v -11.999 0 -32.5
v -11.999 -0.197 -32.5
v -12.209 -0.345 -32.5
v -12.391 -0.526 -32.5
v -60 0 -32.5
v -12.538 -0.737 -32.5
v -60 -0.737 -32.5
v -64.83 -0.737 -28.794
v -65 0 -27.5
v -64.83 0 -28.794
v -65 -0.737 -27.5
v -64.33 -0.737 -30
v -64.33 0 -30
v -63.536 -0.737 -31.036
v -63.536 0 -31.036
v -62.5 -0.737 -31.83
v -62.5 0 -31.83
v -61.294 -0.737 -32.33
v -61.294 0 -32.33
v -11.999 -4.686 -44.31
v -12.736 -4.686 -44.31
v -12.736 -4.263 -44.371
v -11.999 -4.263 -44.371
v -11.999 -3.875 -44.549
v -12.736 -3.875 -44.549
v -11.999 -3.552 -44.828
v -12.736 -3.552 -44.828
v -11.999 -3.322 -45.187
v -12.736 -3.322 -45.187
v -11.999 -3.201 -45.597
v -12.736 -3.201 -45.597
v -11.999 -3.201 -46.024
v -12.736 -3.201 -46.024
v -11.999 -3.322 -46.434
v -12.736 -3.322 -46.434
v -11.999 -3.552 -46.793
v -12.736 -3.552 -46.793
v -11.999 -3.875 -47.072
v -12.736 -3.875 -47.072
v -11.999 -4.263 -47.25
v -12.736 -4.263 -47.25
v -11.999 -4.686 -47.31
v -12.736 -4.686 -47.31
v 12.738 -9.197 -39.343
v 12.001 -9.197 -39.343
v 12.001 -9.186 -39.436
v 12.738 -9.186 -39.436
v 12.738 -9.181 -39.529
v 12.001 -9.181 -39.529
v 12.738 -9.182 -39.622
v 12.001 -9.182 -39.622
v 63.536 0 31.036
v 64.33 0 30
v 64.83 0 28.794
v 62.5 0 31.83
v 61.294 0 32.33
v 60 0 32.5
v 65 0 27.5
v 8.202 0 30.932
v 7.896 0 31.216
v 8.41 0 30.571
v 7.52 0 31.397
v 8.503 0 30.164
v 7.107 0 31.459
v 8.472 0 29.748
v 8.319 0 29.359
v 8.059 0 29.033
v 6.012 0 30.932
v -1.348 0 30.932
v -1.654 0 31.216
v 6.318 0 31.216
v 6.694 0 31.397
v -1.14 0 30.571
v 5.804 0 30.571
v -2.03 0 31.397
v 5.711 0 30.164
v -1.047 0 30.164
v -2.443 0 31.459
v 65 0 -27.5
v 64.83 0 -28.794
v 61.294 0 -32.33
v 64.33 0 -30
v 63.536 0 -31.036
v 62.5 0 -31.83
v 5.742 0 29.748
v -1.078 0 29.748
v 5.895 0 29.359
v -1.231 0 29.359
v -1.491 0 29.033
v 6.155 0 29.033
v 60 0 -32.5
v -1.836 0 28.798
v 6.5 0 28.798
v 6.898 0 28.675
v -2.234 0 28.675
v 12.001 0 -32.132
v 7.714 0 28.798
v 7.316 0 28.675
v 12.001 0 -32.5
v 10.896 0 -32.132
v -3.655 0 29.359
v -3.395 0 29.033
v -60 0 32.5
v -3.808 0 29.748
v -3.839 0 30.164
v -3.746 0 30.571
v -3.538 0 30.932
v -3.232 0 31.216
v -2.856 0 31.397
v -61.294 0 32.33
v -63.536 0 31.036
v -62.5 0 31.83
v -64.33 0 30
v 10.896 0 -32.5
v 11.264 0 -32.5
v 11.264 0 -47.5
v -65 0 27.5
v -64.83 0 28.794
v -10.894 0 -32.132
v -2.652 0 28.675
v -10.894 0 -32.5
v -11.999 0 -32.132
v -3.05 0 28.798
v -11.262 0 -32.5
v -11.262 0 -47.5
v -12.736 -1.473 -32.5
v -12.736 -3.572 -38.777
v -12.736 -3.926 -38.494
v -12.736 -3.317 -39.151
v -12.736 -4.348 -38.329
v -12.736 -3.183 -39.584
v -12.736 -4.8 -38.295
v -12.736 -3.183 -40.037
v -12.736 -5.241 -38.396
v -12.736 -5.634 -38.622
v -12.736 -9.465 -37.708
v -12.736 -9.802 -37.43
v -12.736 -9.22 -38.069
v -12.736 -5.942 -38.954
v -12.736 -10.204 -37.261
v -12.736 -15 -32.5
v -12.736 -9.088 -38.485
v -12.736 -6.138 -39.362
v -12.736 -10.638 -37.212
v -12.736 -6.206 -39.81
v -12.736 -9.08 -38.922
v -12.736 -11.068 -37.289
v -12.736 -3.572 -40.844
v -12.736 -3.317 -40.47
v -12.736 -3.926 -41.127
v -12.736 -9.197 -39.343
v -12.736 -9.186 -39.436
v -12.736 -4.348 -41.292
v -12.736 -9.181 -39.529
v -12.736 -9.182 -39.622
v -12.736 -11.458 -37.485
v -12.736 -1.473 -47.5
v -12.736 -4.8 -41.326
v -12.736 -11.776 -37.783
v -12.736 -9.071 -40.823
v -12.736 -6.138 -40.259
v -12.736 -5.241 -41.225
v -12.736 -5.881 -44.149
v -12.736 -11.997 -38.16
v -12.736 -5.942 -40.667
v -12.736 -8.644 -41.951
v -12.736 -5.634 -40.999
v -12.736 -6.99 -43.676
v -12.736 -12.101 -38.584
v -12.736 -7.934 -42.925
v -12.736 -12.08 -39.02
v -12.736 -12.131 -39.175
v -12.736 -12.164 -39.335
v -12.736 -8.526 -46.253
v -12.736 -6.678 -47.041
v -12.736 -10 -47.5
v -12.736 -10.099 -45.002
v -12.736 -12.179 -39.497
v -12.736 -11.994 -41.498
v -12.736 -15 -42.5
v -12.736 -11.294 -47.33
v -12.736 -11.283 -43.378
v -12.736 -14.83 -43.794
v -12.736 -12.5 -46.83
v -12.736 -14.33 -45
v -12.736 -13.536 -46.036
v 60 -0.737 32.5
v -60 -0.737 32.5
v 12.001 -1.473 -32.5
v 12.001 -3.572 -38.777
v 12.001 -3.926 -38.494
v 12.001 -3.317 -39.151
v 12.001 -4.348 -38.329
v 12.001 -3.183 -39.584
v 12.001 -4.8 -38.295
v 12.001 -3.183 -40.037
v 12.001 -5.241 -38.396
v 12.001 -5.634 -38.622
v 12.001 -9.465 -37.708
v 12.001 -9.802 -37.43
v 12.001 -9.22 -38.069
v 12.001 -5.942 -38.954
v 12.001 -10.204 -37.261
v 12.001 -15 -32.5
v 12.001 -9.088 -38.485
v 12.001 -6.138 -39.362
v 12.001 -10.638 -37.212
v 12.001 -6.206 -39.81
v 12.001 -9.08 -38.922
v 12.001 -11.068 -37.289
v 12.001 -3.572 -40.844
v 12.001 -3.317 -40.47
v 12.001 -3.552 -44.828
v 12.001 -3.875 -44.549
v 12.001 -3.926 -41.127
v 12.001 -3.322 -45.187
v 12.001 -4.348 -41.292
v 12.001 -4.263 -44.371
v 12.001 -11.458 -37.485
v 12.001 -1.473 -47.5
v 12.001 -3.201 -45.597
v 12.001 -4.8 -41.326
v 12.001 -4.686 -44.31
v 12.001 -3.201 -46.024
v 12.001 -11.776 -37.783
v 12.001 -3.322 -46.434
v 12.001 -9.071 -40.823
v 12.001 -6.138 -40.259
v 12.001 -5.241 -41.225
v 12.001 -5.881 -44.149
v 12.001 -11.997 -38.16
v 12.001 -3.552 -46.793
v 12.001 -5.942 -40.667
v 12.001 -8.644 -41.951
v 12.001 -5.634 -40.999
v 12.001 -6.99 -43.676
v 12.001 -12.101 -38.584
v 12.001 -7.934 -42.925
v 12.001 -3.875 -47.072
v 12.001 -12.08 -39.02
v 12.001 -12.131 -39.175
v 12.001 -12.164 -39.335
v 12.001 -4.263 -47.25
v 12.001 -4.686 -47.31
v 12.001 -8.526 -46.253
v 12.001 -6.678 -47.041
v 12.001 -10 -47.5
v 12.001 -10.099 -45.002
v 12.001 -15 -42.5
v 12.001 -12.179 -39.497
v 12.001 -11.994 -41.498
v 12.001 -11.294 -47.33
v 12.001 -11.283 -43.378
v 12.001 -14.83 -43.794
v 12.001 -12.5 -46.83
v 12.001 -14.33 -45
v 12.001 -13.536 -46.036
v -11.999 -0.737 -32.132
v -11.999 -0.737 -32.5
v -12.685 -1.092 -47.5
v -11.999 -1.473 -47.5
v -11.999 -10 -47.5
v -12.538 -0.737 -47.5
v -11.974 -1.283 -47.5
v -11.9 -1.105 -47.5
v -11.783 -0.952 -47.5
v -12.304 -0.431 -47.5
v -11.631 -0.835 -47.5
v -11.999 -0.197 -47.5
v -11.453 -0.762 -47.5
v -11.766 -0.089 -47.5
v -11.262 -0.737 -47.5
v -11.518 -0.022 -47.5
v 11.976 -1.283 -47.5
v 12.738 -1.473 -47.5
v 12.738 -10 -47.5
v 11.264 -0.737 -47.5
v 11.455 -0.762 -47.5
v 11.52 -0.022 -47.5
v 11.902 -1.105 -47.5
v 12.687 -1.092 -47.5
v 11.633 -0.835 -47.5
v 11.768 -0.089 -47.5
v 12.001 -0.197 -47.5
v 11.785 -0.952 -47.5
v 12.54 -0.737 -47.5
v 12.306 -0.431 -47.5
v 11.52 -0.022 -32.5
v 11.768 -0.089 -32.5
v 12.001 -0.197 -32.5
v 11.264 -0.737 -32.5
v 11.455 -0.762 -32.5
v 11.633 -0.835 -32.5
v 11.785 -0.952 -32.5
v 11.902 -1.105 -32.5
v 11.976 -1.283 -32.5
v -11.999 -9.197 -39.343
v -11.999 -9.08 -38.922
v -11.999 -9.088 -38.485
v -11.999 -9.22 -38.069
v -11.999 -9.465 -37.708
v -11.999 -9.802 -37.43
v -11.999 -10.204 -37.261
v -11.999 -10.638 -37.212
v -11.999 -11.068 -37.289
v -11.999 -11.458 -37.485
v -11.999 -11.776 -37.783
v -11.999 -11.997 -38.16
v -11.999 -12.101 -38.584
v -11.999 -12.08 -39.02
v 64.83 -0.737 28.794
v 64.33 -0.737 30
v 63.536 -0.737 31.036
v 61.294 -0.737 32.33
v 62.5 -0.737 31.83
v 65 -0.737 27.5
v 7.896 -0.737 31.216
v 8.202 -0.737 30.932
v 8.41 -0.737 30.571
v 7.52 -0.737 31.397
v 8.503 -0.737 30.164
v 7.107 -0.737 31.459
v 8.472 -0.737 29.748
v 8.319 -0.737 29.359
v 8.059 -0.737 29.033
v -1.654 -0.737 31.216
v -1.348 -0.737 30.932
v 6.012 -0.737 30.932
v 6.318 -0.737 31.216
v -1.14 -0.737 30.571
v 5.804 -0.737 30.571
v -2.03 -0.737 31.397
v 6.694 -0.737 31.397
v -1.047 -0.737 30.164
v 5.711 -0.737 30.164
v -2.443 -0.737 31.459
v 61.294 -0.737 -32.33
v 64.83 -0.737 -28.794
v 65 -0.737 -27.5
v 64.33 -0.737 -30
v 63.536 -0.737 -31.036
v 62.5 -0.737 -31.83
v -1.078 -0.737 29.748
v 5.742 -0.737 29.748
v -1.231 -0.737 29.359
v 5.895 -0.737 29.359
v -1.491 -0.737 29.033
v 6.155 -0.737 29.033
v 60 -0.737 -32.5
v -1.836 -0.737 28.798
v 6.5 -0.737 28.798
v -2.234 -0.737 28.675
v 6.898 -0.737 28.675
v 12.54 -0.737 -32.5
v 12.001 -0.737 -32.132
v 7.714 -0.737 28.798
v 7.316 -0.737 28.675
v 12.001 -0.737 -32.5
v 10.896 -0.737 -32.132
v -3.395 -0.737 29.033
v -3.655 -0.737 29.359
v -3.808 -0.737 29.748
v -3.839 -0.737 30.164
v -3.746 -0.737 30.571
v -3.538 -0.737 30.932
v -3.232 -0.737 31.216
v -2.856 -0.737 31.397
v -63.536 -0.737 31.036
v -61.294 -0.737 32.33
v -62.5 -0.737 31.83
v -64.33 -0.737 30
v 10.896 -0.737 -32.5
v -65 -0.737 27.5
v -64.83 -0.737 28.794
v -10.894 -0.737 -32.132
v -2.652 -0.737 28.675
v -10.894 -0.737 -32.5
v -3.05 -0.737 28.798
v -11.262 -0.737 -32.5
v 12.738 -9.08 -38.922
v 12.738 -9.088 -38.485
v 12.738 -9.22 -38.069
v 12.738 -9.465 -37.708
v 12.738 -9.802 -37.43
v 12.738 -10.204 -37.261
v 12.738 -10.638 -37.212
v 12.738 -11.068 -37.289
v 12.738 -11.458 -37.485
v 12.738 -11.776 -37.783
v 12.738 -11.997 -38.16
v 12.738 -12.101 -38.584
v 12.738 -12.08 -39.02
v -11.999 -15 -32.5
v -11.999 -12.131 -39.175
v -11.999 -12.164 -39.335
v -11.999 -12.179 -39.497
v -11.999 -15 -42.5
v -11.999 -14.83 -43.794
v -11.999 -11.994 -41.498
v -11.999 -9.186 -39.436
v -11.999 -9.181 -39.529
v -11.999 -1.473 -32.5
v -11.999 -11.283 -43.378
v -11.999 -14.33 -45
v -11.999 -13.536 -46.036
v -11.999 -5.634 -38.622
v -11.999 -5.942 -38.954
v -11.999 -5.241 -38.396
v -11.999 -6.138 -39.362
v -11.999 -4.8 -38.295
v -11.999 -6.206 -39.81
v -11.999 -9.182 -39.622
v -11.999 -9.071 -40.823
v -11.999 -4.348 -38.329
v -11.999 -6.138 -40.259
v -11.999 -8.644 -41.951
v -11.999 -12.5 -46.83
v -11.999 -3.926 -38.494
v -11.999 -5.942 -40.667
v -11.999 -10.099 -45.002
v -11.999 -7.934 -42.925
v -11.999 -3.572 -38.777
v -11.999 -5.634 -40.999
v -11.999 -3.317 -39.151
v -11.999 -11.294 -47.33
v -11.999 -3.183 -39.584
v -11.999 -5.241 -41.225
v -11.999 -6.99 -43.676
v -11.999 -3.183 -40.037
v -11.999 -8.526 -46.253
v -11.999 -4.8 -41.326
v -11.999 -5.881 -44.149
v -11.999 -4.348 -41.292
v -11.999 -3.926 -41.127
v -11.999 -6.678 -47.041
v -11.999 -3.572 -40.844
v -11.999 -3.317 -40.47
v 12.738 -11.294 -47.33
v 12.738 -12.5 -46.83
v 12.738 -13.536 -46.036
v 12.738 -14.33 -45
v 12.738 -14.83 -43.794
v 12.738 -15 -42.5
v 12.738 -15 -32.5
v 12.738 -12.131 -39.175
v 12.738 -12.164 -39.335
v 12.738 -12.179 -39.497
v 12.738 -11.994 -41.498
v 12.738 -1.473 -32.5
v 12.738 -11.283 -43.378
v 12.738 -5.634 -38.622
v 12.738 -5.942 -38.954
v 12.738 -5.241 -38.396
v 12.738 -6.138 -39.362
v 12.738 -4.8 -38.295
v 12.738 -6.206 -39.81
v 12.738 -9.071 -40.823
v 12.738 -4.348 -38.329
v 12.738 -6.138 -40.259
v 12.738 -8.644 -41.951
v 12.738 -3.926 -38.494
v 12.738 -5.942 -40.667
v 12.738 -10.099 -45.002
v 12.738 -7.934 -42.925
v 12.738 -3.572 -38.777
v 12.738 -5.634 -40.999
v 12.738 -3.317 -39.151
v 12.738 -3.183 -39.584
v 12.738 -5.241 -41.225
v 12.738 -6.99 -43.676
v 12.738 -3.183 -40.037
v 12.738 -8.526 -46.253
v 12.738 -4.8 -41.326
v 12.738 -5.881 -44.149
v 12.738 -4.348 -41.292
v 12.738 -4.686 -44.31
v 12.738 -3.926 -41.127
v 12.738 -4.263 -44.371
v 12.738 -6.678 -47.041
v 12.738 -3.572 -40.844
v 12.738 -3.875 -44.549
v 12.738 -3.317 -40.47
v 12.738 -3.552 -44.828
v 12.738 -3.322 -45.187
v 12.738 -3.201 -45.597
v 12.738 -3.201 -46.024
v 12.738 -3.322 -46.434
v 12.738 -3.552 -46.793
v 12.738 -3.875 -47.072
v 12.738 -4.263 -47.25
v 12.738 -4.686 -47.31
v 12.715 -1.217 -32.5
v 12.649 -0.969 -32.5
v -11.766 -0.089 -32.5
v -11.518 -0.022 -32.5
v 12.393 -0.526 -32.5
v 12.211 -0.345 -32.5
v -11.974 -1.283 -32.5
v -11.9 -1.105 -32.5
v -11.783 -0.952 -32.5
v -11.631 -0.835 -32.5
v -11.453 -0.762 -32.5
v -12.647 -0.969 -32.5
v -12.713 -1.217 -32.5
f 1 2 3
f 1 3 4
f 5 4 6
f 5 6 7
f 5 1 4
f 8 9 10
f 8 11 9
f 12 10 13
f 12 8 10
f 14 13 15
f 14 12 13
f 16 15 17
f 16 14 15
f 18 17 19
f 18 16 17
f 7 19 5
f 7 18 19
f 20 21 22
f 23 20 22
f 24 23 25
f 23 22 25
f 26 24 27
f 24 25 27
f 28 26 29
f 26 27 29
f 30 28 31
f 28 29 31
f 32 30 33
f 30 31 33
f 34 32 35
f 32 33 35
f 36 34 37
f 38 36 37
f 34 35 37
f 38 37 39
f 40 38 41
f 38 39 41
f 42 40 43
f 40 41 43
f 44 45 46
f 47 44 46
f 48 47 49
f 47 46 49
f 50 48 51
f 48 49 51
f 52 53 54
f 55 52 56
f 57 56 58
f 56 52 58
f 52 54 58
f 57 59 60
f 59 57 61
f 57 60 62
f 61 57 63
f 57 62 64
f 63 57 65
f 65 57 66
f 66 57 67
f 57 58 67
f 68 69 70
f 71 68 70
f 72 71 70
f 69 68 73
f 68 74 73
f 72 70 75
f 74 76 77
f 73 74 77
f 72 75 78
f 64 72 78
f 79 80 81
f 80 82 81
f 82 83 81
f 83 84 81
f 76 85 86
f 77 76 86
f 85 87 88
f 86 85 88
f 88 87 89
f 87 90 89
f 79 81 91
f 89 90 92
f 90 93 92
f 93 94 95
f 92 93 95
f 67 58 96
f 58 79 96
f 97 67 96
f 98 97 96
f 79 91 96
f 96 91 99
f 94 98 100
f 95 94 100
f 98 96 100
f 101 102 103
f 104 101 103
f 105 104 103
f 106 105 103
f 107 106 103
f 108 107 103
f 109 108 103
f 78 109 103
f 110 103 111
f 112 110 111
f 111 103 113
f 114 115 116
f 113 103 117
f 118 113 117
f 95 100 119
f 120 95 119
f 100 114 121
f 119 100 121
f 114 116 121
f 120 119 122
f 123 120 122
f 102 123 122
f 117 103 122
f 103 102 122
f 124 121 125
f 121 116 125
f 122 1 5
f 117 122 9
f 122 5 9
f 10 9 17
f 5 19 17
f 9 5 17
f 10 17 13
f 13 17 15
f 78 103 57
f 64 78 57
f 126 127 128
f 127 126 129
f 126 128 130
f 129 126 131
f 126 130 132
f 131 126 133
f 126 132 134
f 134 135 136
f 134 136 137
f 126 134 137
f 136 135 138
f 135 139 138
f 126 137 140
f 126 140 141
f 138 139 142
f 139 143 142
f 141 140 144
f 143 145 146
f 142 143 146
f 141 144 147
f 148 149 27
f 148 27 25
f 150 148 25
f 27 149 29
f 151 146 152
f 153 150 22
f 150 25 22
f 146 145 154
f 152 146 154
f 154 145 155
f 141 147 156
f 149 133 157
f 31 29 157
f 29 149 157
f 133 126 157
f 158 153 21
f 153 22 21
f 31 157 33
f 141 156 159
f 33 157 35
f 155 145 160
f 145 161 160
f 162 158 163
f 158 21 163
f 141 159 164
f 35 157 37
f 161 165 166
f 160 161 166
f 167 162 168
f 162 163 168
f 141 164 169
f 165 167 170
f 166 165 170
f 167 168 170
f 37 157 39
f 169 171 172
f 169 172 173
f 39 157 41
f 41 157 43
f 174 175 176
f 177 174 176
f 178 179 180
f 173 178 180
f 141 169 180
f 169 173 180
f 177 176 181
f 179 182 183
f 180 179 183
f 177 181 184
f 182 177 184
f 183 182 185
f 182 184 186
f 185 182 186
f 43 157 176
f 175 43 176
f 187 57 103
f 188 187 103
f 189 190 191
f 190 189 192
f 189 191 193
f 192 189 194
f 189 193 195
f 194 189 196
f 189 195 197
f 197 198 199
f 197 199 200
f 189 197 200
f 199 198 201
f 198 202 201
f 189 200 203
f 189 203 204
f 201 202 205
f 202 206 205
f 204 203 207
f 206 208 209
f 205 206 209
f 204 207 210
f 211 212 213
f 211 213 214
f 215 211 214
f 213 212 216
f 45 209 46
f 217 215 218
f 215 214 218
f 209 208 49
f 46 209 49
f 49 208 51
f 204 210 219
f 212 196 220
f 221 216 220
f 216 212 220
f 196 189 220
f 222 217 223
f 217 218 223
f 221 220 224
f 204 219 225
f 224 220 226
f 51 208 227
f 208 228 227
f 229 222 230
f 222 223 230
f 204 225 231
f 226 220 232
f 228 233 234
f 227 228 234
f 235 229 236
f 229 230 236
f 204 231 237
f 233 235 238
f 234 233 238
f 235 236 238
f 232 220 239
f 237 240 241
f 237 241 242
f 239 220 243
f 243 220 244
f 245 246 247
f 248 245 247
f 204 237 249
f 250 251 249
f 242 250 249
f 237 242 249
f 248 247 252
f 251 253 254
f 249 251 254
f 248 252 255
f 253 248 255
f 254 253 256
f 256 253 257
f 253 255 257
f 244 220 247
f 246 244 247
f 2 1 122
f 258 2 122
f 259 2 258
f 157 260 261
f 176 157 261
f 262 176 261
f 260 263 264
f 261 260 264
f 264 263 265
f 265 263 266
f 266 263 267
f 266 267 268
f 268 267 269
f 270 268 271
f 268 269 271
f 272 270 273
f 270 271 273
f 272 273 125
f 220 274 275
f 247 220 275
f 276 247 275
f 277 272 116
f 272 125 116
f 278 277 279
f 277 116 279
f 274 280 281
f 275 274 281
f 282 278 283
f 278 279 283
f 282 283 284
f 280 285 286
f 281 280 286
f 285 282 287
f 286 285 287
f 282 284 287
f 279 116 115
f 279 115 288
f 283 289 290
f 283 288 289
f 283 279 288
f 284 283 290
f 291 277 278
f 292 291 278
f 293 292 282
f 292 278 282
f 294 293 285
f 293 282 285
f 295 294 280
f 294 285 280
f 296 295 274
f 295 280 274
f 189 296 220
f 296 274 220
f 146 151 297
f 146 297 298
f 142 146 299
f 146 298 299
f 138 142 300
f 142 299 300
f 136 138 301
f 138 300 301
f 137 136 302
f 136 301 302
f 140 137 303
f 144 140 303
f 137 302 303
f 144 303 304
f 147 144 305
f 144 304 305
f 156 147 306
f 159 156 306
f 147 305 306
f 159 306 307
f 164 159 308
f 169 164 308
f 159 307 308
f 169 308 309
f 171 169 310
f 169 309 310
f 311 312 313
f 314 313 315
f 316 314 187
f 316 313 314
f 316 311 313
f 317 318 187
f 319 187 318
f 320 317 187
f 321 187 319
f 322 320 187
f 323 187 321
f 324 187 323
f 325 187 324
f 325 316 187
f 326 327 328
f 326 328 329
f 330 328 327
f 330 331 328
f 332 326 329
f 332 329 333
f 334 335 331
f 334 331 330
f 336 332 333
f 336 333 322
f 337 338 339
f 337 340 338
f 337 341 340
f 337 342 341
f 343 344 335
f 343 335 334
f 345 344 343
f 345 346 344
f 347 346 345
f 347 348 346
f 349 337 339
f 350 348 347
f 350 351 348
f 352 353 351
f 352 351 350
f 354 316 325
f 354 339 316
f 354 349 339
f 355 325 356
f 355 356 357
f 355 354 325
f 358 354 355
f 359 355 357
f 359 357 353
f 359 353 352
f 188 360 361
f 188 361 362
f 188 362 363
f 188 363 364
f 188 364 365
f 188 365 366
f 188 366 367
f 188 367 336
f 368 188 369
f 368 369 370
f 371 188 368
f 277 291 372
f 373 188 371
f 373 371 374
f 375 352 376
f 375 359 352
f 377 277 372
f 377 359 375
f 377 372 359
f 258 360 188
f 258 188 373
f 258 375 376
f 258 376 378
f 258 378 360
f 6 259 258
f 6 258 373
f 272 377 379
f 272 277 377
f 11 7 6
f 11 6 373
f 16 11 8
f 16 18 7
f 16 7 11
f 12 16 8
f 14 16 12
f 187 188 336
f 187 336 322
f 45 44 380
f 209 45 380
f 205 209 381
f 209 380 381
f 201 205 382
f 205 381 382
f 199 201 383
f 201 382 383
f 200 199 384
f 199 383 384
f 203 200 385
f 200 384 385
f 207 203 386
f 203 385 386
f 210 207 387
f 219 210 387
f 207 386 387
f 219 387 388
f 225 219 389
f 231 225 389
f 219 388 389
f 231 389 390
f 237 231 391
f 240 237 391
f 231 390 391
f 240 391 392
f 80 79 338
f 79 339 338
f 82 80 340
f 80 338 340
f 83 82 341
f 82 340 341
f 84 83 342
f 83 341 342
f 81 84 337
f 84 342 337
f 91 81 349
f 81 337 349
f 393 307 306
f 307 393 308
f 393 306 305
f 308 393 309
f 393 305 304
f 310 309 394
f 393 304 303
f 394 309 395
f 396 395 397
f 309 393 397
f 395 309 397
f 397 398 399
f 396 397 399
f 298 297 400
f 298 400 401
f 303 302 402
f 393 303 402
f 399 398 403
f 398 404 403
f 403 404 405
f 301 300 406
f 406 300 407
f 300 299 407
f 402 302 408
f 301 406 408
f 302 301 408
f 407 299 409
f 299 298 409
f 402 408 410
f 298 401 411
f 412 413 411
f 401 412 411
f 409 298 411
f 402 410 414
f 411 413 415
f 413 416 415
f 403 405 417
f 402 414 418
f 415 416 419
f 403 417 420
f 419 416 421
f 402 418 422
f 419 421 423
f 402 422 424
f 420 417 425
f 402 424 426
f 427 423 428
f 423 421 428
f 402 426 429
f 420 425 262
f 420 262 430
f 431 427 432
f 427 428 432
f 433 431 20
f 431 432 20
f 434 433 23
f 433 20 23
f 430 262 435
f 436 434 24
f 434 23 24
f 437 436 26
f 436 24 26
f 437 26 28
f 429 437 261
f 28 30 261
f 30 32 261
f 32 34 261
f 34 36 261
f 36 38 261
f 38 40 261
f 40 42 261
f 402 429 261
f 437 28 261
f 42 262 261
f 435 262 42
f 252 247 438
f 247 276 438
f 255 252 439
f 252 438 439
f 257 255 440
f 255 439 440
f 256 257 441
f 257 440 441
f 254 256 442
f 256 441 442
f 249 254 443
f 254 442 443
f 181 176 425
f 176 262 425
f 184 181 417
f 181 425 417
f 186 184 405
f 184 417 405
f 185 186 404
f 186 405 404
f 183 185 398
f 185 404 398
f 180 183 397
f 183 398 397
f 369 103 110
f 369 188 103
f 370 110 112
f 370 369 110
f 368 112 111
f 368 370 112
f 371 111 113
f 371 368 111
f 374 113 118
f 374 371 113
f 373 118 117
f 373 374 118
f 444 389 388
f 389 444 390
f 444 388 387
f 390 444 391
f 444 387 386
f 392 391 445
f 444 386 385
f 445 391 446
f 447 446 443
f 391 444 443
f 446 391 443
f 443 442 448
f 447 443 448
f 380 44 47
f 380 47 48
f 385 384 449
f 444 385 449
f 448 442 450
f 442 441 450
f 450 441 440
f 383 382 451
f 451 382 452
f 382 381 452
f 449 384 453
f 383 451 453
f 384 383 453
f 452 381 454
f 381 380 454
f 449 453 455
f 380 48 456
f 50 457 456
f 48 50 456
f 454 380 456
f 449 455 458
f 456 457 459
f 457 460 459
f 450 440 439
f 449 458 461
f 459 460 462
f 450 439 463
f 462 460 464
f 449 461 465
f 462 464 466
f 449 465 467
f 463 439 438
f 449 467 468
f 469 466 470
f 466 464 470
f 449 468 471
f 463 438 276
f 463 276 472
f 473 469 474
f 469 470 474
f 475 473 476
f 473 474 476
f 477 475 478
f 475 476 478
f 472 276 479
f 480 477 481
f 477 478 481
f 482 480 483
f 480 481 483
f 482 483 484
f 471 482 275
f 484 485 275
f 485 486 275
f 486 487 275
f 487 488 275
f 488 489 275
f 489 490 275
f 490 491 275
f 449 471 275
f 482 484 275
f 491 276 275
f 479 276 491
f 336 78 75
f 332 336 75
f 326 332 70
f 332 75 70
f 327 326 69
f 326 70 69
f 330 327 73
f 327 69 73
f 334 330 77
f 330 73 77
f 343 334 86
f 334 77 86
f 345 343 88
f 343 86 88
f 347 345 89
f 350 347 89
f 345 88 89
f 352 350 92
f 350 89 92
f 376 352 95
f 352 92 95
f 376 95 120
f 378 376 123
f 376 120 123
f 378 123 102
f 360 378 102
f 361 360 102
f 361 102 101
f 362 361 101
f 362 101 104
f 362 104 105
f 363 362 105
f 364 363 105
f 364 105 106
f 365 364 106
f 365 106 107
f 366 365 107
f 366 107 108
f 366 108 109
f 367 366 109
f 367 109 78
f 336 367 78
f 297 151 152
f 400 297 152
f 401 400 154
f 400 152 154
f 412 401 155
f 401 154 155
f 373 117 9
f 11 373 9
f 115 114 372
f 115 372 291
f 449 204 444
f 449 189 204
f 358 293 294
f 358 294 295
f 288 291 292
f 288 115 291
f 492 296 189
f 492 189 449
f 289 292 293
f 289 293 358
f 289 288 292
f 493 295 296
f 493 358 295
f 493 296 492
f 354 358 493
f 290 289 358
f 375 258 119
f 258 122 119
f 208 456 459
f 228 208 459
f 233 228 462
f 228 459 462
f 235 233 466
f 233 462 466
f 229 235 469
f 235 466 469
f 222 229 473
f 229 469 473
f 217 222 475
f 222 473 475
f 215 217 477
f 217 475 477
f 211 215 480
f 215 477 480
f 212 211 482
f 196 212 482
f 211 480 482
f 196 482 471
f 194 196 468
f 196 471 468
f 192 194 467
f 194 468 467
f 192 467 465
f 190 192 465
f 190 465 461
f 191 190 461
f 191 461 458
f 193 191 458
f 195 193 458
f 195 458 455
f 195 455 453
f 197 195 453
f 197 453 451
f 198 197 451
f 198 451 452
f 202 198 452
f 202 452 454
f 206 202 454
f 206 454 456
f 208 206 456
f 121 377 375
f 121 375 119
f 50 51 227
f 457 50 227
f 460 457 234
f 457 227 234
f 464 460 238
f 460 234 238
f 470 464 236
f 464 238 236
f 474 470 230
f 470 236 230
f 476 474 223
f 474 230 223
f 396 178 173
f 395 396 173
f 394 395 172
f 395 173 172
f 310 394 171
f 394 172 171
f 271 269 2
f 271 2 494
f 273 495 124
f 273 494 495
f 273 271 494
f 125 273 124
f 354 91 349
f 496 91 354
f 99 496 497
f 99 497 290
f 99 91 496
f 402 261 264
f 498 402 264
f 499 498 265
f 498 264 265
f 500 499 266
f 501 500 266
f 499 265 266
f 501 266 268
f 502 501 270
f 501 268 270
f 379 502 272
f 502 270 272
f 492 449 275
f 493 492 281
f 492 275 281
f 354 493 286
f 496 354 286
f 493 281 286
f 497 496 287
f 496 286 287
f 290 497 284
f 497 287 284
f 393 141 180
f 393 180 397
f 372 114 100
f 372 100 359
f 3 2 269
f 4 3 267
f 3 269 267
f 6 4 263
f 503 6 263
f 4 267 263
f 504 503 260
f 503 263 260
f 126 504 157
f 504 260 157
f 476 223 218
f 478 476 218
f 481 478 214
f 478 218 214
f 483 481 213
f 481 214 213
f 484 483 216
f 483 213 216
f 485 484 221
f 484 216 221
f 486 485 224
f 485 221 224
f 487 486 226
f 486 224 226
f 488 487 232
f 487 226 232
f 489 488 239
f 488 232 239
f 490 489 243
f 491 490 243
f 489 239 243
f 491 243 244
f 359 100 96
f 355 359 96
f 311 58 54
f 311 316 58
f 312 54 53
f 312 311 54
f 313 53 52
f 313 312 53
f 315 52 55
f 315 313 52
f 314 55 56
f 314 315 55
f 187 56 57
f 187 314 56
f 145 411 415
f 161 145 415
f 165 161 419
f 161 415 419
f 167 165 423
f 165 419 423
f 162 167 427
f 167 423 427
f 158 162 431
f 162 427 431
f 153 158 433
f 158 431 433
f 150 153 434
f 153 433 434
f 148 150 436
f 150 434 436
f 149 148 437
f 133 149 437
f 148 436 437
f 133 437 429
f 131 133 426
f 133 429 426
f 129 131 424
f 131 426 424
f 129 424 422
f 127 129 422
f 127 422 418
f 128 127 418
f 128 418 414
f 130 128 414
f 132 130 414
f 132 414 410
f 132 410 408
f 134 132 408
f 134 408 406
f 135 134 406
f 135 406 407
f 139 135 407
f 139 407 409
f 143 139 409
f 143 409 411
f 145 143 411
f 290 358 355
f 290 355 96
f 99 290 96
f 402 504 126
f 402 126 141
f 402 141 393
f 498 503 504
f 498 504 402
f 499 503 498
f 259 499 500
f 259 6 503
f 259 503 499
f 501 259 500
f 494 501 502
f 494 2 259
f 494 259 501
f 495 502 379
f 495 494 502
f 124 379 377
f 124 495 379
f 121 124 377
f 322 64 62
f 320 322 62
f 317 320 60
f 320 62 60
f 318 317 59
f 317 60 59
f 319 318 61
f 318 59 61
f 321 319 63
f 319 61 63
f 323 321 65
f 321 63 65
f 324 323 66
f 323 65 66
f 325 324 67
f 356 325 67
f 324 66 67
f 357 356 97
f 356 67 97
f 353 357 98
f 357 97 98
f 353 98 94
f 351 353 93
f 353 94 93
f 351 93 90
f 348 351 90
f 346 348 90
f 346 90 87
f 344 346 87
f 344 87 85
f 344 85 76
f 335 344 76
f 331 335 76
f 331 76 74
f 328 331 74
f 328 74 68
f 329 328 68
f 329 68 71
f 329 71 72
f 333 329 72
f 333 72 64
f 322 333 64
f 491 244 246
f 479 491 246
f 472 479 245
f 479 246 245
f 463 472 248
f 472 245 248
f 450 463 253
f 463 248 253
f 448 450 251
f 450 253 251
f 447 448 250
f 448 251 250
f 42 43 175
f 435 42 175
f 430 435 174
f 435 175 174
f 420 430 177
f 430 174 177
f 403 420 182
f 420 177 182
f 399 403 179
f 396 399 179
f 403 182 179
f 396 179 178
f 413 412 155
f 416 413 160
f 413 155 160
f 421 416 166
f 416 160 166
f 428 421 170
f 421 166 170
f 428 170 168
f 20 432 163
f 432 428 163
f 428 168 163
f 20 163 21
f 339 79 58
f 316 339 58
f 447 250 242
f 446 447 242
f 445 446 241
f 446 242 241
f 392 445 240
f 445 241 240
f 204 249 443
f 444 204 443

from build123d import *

# Parameters (mm, degrees)
BASE_FLANGE1_DEPTH   = 0.7366
FILLET1_R            = 5
FILLET2_R            = 5
FILLET3_R            = 5
FILLET4_R            = 5
EDGE_FLANGE2_START   = -47.5
EDGE_FLANGE2_DEPTH   = 15.3683
EDGE_FLANGE2_START_2 = -32.5
EDGE_FLANGE2_2_DEPTH = 0.3683
EDGE_FLANGE2_3_DEPTH = 15
FILLET7_R            = 5
FILLET8_R            = 5
SKETCH18_R           = 1.5
CUT_EXTRUDE1_DEPTH   = 40
SKETCH23_R           = 1.52
CUT_EXTRUDE6_DEPTH   = 30
SKETCH24_R           = 1.52
CUT_EXTRUDE7_DEPTH   = 30
SKETCH25_R           = 1.4
CUT_EXTRUDE8_DEPTH   = 10


with BuildPart() as part:
    # Base-Flange1: sheet metal written as solids
    # Sketch1 → Base-Flange1 (new body)
    with BuildSketch(Plane(origin=(0, 0, 0), x_dir=(1, 0, 0), z_dir=(0, 1, 0))):
        Polygon((19.610938441, 32.5), (65, 32.5), (65, -32.5), (-65, -32.5), (-65, 32.5), (-19.610938441, 32.5), (-11.999061559, 32.5), (-11.999061559, 47.5), (12.000938441, 47.5), (12.000938441, 32.5), align=None)
    extrude(amount=-BASE_FLANGE1_DEPTH)

    # Fillet1
    fillet1_edges = [part.edges().sort_by_distance(p)[0] for p in [
        (65, -0.3683, 32.5),
    ]]
    fillet(fillet1_edges, radius=FILLET1_R)

    # Fillet2
    fillet2_edges = [part.edges().sort_by_distance(p)[0] for p in [
        (65, -0.3683, -32.5),
    ]]
    fillet(fillet2_edges, radius=FILLET2_R)

    # Fillet3
    fillet3_edges = [part.edges().sort_by_distance(p)[0] for p in [
        (-65, -0.3683, 32.5),
    ]]
    fillet(fillet3_edges, radius=FILLET3_R)

    # Fillet4
    fillet4_edges = [part.edges().sort_by_distance(p)[0] for p in [
        (-65, -0.3683, -32.5),
    ]]
    fillet(fillet4_edges, radius=FILLET4_R)

    # Edge-Flange2: read off the stored shape, not the designer's step
    # Edge-Flange2 outline → Edge-Flange2 (cut)
    with BuildSketch(Plane.XY.offset(EDGE_FLANGE2_START)):
        with BuildLine():
            ThreePointArc((-11.999061559, -0.197371375), (-11.643753776, -0.050198073), (-11.262461559, 0))
            Line((-11.262461559, 0), (-11.999061559, 0))
            Line((-11.999061559, 0), (-11.999061559, -0.197371375))
        make_face()
        with BuildLine():
            ThreePointArc((11.264338441, 0), (11.645630659, -0.050198073), (12.000938441, -0.197371375))
            Line((12.000938441, -0.197371375), (12.000938441, 0))
            Line((12.000938441, 0), (11.264338441, 0))
        make_face()
    extrude(amount=EDGE_FLANGE2_DEPTH, mode=Mode.SUBTRACT)

    # Edge-Flange2 2 outline → Edge-Flange2 2 (cut)
    with BuildSketch(Plane.XY.offset(EDGE_FLANGE2_START_2)):
        with BuildLine():
            Line((-11.999061559, -0.7366), (-10.894161559, -0.7366))
            Line((-10.894161559, -0.7366), (-10.894161559, 0))
            Line((-10.894161559, 0), (-11.262461559, 0))
            ThreePointArc((-11.262461559, 0), (-11.643753776, -0.050198073), (-11.999061559, -0.197371375))
            Line((-11.999061559, -0.197371375), (-11.999061559, -0.7366))
        make_face()
        with BuildLine():
            Line((12.000938441, -0.7366), (12.000938441, -0.197371375))
            ThreePointArc((12.000938441, -0.197371375), (11.645630659, -0.050198073), (11.264338441, 0))
            Line((11.264338441, 0), (10.896038441, 0))
            Line((10.896038441, 0), (10.896038441, -0.7366))
            Line((10.896038441, -0.7366), (12.000938441, -0.7366))
        make_face()
    extrude(amount=EDGE_FLANGE2_2_DEPTH, mode=Mode.SUBTRACT)

    # Edge-Flange2 3 outline → Edge-Flange2 3 (add)
    with BuildSketch(Plane.XY.offset(EDGE_FLANGE2_START)):
        with BuildLine():
            ThreePointArc((-11.999061559, -1.4732), (-11.783316414, -0.952345145), (-11.262461559, -0.7366))
            Line((-11.262461559, -0.7366), (-11.999061559, -0.7366))
            Line((-11.999061559, -0.7366), (-11.999061559, -0.197371375))
            ThreePointArc((-11.999061559, -0.197371375), (-12.538290183, -0.7366), (-12.735661559, -1.4732))
            Line((-12.735661559, -1.4732), (-12.735661559, -15))
            Line((-12.735661559, -15), (-11.999061559, -15))
            Line((-11.999061559, -15), (-11.999061559, -1.4732))
        make_face()
        with BuildLine():
            Line((12.737538441, -15), (12.737538441, -1.4732))
            ThreePointArc((12.737538441, -1.4732), (12.540167066, -0.7366), (12.000938441, -0.197371375))
            Line((12.000938441, -0.197371375), (12.000938441, -0.7366))
            Line((12.000938441, -0.7366), (11.264338441, -0.7366))
            ThreePointArc((11.264338441, -0.7366), (11.785193296, -0.952345145), (12.000938441, -1.4732))
            Line((12.000938441, -1.4732), (12.000938441, -15))
            Line((12.000938441, -15), (12.737538441, -15))
        make_face()
    extrude(amount=EDGE_FLANGE2_3_DEPTH)

    # Fillet7
    fillet7_edges = [part.edges().sort_by_distance(p)[0] for p in [
        (12.369238441, -15, -47.5),
    ]]
    fillet(fillet7_edges, radius=FILLET7_R)

    # Fillet8
    fillet8_edges = [part.edges().sort_by_distance(p)[0] for p in [
        (-12.367361559, -15, -47.5),
    ]]
    fillet(fillet8_edges, radius=FILLET8_R)

    # Sketch18 → Cut-Extrude1 (cut)
    with BuildSketch(Plane.ZY.offset(12.735661559)):
        with Locations(Location((-39.810498868, -4.68598948, 0), (0, 0, 270))):
            Circle(SKETCH18_R)
        with BuildLine():
            ThreePointArc((-39.496869826, -12.179429066), (-38.060907717, -10.61801534), (-39.622321443, -9.182053232))
            ThreePointArc((-39.622321443, -9.182053232), (-42.925238149, -7.933819403), (-44.310498868, -4.68598948))
            ThreePointArc((-44.310498868, -4.68598948), (-45.810498868, -3.18598948), (-47.310498868, -4.68598948))
            ThreePointArc((-47.310498868, -4.68598948), (-45.001731004, -10.099039351), (-39.496869826, -12.179429066))
        make_face()
    extrude(amount=-CUT_EXTRUDE1_DEPTH, mode=Mode.SUBTRACT)

    # Sketch23 → Cut-Extrude6 (cut)
    with BuildSketch(Plane(origin=(13.900294902, -97.850887802, -222.979867512), x_dir=(-3.678229639825758e-15, -0.0327435829113364, -0.9994637851258686), z_dir=(1, 0, 0))):
        with Locations(Location((-186.121703077, 87.117320509, 0), (0, 0, 271.876404504))):
            Circle(SKETCH23_R)
    extrude(amount=-CUT_EXTRUDE6_DEPTH, mode=Mode.SUBTRACT)

    # Sketch24 → Cut-Extrude7 (cut)
    with BuildSketch(Plane(origin=(13.900294902, -97.850887802, -222.979867512), x_dir=(-3.678229639825758e-15, -0.0327435829113364, -0.9994637851258686), z_dir=(1, 0, 0))):
        with Locations((-187.007062576, 81.183001798)):
            Circle(SKETCH24_R)
    extrude(amount=-CUT_EXTRUDE7_DEPTH, mode=Mode.SUBTRACT)

    # Sketch25 → Cut-Extrude8 (cut)
    with BuildSketch(Plane(origin=(-71.983966672, 0, -96.098250098), x_dir=(1, 0, 0), z_dir=(0, 1, 0))):
        with Locations(Location((79.090906604, -126.157708005, 0), (0, 0, 270))):
            Circle(SKETCH25_R)
        with Locations(Location((69.540906604, -126.157708005, 0), (0, 0, 270))):
            Circle(SKETCH25_R)
    extrude(amount=-CUT_EXTRUDE8_DEPTH, mode=Mode.SUBTRACT)


solid = part.part
